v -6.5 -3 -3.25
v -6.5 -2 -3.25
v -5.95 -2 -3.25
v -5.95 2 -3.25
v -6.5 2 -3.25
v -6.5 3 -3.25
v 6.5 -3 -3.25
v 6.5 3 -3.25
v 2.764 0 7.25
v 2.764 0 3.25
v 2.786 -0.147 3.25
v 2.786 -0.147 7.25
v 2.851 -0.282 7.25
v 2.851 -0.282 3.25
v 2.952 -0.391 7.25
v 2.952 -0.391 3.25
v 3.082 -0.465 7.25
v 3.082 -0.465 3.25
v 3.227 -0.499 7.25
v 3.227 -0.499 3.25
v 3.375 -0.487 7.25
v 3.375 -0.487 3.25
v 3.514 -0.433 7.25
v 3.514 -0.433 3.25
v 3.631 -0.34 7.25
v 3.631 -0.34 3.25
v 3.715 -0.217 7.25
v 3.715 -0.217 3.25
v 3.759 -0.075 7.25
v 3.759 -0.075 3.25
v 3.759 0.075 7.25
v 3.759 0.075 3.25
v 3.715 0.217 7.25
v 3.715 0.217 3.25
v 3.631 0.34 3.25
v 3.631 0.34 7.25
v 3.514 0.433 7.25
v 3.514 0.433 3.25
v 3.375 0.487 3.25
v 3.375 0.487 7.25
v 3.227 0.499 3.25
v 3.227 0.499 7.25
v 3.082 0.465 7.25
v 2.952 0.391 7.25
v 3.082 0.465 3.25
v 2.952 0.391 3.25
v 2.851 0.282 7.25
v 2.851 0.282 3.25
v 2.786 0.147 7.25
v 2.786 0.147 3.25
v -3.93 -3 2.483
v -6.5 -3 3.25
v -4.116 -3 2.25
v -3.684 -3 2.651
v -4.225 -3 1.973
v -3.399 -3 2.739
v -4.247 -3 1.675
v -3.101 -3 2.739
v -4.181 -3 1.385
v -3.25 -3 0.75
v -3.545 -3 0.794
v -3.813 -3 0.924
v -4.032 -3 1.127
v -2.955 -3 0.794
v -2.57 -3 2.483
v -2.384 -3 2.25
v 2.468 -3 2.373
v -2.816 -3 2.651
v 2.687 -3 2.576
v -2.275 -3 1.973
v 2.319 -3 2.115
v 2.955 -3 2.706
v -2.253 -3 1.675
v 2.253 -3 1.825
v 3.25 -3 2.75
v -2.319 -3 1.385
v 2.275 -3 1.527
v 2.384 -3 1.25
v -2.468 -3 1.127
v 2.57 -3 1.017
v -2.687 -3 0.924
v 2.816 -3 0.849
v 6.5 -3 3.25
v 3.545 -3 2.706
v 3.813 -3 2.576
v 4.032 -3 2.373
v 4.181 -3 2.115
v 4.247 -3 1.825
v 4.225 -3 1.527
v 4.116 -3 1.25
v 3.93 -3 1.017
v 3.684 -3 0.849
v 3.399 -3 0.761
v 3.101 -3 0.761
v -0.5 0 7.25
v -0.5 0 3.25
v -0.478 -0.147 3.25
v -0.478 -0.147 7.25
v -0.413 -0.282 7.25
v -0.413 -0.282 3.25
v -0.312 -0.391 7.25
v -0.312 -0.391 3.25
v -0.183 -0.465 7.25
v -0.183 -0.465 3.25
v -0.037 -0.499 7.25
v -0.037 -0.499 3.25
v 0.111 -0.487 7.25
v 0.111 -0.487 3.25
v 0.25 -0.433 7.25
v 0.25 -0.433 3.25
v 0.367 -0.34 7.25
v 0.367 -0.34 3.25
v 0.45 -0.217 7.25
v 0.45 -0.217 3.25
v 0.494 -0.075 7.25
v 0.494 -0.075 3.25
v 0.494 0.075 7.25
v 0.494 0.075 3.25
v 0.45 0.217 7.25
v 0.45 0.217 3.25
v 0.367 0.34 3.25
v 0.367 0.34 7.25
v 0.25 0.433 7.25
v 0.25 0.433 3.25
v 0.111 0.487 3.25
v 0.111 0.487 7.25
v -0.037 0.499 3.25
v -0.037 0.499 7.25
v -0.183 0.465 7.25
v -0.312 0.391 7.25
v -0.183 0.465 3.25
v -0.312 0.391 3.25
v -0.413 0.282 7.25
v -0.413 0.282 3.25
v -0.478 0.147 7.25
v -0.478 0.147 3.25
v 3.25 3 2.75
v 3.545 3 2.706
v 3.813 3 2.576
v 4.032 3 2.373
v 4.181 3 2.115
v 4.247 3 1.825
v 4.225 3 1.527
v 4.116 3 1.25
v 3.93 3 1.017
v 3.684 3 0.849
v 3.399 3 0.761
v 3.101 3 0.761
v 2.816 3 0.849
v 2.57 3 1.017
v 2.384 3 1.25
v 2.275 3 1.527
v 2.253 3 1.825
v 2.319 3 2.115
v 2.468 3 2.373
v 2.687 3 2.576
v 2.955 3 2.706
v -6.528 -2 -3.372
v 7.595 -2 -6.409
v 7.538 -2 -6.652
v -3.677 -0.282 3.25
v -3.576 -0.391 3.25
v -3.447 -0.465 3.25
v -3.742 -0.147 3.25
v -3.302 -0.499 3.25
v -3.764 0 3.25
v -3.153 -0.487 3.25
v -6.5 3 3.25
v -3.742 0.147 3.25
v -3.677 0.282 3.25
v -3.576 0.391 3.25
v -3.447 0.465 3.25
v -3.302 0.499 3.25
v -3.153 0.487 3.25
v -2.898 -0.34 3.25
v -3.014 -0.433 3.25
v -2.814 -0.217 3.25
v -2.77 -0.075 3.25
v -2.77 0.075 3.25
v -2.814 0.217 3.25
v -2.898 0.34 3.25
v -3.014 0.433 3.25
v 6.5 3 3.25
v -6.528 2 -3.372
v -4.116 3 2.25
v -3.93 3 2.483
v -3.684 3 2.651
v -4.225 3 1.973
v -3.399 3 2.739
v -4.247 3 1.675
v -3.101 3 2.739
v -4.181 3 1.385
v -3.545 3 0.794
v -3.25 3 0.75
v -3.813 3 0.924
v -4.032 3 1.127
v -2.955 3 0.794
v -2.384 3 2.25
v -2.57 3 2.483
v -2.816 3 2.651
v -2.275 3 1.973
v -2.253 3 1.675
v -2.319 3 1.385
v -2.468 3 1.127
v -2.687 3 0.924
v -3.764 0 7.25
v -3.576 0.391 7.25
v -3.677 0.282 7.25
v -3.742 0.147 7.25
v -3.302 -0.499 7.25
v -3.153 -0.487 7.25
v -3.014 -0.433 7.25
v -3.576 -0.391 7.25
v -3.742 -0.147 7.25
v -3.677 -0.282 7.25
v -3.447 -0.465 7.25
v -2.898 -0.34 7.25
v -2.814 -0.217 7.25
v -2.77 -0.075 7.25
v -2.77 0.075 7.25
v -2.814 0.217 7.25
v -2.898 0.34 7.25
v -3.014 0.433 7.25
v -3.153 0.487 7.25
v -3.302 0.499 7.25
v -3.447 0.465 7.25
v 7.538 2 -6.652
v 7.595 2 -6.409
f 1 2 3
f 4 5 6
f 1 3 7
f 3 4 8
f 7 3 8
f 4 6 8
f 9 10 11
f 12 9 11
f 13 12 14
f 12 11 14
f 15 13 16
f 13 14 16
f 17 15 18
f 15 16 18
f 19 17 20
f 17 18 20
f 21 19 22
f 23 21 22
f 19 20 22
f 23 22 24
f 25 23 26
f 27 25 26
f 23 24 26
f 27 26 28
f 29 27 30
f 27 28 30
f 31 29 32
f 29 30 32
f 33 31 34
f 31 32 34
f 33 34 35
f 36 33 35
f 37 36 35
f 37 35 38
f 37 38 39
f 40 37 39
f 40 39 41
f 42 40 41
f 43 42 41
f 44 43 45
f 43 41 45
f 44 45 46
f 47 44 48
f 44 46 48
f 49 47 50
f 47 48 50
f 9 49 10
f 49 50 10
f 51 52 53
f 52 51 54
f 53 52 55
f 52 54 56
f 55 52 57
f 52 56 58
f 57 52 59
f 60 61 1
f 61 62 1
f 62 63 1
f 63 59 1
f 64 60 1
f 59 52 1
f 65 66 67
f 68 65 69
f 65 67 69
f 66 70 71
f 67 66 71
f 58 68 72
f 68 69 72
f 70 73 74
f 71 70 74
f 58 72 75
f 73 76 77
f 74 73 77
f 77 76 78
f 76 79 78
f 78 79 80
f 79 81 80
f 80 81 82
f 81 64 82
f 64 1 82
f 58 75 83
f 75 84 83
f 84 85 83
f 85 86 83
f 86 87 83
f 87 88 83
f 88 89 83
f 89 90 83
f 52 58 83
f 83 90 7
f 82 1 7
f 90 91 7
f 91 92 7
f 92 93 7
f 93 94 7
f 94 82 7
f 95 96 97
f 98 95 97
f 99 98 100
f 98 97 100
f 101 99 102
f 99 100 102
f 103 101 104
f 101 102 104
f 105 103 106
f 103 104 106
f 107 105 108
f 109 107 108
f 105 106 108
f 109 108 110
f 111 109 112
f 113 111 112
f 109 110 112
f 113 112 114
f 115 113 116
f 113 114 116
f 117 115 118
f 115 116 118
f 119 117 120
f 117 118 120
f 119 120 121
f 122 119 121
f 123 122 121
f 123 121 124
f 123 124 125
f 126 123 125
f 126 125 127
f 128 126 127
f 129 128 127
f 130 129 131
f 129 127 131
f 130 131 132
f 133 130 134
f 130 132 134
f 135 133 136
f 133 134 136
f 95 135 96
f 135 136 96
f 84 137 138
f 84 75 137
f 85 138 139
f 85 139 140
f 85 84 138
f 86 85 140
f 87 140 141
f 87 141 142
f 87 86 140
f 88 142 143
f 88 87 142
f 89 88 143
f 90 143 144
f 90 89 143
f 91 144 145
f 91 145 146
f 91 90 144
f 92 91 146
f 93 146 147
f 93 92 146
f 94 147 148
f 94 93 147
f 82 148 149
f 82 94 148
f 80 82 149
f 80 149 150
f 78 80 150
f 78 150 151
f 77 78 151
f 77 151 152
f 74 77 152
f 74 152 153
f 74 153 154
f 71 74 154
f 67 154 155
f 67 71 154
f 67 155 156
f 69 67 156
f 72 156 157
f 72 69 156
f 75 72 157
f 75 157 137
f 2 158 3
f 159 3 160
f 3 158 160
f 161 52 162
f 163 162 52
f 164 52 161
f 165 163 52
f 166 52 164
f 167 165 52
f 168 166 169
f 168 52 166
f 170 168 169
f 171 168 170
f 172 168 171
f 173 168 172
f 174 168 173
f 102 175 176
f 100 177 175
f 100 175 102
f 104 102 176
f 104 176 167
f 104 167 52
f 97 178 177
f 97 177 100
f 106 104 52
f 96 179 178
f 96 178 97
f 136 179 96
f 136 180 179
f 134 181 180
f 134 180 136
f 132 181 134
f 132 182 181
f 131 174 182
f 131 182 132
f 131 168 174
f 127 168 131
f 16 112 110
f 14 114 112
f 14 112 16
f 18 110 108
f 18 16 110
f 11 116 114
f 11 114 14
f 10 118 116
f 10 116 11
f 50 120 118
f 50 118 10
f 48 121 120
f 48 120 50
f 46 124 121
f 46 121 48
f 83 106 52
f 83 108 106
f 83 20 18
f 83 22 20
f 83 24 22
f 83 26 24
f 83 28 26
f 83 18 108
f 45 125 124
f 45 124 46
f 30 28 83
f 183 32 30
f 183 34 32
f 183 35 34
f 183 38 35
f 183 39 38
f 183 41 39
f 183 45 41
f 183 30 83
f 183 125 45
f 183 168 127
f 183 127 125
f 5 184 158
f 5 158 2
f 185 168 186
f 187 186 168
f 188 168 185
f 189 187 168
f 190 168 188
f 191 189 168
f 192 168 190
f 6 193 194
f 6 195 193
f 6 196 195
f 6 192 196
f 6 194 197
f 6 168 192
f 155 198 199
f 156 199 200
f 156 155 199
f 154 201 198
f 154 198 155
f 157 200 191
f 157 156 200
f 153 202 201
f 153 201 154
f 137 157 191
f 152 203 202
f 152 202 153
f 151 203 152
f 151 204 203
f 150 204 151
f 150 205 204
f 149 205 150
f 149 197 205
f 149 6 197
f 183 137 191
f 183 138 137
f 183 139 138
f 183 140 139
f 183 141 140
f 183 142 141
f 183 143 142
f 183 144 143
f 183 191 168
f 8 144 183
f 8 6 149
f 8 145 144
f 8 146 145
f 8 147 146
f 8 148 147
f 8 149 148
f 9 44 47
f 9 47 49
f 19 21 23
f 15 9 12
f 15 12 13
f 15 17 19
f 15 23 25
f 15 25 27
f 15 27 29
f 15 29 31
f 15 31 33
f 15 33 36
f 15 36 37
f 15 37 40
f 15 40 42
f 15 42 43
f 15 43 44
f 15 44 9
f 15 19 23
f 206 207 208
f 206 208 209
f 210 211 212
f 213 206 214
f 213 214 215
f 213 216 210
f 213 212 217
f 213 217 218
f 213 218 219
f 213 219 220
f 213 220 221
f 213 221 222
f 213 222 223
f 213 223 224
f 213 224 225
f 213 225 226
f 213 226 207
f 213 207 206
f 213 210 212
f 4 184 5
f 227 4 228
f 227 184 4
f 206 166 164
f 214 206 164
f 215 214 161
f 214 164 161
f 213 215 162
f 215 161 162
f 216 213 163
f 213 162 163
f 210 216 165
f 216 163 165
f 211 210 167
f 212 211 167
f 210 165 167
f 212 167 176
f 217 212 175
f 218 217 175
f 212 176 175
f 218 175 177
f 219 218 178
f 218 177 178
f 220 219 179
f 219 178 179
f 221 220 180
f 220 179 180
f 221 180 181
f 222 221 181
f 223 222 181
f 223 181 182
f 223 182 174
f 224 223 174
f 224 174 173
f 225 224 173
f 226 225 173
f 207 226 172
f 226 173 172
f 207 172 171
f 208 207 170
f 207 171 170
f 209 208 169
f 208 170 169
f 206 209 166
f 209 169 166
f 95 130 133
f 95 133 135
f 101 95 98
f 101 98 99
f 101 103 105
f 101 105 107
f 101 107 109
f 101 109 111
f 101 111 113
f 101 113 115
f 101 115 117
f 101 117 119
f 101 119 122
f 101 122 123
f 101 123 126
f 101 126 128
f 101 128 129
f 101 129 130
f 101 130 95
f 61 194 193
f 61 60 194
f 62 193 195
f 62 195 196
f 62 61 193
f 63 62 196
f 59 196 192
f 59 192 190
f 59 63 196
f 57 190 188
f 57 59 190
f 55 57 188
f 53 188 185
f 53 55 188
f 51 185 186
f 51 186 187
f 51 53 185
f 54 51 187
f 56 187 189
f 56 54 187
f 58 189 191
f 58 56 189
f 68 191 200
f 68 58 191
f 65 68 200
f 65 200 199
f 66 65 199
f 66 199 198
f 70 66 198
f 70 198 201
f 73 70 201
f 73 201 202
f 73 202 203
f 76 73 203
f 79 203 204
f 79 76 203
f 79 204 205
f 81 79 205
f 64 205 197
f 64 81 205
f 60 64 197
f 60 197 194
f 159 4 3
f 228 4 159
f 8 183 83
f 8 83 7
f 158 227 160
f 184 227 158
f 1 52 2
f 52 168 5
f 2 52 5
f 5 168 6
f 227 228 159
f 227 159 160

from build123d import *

# Parameters (mm, degrees)
SKETCH_1_W        = 13
SKETCH_1_H        = 6.5
SKETCH_1_R        = 1
EXTRUDE_1_DEPTH   = 3
SKETCH_2_R        = 0.5
EXTRUDE_2_DEPTH   = 4
EXTRUDE_1_2_DEPTH = 2


with BuildPart() as part:
    # Эскиз1 → Extrude 1 (new, symmetric)
    with BuildSketch(Plane(origin=(0, 0, 0), x_dir=(1, 0, 0), z_dir=(0, 1, 0))):
        Rectangle(SKETCH_1_W, SKETCH_1_H)
        with Locations(Location((3.25, -1.75, 0), (0, 0, 270))):
            Circle(SKETCH_1_R, mode=Mode.SUBTRACT)
        with Locations(Location((-3.25, -1.75, 0), (0, 0, 90))):
            Circle(SKETCH_1_R, mode=Mode.SUBTRACT)
    extrude(amount=EXTRUDE_1_DEPTH, both=True)

    # Эскиз2 → Бобышка-Вытянуть2 (add)
    with BuildSketch(Plane.XY.offset(3.25)):
        with Locations(Location((-3.264227948, 0, 0), (0, 0, 180))):
            Circle(SKETCH_2_R)
        with Locations(Location((0, 0, 0), (0, 0, 180))):
            Circle(SKETCH_2_R)
        with Locations(Location((3.264227948, 0, 0), (0, 0, 180))):
            Circle(SKETCH_2_R)
    extrude(amount=EXTRUDE_2_DEPTH)

    # Эскиз3 → Extrude 1 2 (add, symmetric)
    with BuildSketch(Plane(origin=(0, 0, 0), x_dir=(1, 0, 0), z_dir=(0, 1, 0))):
        Polygon((-6.471609365, 3.1282668), (7.594638597, 6.4087992), (7.537857328, 6.6522656), (-6.528390635, 3.3717332), align=None)
    extrude(amount=EXTRUDE_1_2_DEPTH, both=True)


solid = part.part
